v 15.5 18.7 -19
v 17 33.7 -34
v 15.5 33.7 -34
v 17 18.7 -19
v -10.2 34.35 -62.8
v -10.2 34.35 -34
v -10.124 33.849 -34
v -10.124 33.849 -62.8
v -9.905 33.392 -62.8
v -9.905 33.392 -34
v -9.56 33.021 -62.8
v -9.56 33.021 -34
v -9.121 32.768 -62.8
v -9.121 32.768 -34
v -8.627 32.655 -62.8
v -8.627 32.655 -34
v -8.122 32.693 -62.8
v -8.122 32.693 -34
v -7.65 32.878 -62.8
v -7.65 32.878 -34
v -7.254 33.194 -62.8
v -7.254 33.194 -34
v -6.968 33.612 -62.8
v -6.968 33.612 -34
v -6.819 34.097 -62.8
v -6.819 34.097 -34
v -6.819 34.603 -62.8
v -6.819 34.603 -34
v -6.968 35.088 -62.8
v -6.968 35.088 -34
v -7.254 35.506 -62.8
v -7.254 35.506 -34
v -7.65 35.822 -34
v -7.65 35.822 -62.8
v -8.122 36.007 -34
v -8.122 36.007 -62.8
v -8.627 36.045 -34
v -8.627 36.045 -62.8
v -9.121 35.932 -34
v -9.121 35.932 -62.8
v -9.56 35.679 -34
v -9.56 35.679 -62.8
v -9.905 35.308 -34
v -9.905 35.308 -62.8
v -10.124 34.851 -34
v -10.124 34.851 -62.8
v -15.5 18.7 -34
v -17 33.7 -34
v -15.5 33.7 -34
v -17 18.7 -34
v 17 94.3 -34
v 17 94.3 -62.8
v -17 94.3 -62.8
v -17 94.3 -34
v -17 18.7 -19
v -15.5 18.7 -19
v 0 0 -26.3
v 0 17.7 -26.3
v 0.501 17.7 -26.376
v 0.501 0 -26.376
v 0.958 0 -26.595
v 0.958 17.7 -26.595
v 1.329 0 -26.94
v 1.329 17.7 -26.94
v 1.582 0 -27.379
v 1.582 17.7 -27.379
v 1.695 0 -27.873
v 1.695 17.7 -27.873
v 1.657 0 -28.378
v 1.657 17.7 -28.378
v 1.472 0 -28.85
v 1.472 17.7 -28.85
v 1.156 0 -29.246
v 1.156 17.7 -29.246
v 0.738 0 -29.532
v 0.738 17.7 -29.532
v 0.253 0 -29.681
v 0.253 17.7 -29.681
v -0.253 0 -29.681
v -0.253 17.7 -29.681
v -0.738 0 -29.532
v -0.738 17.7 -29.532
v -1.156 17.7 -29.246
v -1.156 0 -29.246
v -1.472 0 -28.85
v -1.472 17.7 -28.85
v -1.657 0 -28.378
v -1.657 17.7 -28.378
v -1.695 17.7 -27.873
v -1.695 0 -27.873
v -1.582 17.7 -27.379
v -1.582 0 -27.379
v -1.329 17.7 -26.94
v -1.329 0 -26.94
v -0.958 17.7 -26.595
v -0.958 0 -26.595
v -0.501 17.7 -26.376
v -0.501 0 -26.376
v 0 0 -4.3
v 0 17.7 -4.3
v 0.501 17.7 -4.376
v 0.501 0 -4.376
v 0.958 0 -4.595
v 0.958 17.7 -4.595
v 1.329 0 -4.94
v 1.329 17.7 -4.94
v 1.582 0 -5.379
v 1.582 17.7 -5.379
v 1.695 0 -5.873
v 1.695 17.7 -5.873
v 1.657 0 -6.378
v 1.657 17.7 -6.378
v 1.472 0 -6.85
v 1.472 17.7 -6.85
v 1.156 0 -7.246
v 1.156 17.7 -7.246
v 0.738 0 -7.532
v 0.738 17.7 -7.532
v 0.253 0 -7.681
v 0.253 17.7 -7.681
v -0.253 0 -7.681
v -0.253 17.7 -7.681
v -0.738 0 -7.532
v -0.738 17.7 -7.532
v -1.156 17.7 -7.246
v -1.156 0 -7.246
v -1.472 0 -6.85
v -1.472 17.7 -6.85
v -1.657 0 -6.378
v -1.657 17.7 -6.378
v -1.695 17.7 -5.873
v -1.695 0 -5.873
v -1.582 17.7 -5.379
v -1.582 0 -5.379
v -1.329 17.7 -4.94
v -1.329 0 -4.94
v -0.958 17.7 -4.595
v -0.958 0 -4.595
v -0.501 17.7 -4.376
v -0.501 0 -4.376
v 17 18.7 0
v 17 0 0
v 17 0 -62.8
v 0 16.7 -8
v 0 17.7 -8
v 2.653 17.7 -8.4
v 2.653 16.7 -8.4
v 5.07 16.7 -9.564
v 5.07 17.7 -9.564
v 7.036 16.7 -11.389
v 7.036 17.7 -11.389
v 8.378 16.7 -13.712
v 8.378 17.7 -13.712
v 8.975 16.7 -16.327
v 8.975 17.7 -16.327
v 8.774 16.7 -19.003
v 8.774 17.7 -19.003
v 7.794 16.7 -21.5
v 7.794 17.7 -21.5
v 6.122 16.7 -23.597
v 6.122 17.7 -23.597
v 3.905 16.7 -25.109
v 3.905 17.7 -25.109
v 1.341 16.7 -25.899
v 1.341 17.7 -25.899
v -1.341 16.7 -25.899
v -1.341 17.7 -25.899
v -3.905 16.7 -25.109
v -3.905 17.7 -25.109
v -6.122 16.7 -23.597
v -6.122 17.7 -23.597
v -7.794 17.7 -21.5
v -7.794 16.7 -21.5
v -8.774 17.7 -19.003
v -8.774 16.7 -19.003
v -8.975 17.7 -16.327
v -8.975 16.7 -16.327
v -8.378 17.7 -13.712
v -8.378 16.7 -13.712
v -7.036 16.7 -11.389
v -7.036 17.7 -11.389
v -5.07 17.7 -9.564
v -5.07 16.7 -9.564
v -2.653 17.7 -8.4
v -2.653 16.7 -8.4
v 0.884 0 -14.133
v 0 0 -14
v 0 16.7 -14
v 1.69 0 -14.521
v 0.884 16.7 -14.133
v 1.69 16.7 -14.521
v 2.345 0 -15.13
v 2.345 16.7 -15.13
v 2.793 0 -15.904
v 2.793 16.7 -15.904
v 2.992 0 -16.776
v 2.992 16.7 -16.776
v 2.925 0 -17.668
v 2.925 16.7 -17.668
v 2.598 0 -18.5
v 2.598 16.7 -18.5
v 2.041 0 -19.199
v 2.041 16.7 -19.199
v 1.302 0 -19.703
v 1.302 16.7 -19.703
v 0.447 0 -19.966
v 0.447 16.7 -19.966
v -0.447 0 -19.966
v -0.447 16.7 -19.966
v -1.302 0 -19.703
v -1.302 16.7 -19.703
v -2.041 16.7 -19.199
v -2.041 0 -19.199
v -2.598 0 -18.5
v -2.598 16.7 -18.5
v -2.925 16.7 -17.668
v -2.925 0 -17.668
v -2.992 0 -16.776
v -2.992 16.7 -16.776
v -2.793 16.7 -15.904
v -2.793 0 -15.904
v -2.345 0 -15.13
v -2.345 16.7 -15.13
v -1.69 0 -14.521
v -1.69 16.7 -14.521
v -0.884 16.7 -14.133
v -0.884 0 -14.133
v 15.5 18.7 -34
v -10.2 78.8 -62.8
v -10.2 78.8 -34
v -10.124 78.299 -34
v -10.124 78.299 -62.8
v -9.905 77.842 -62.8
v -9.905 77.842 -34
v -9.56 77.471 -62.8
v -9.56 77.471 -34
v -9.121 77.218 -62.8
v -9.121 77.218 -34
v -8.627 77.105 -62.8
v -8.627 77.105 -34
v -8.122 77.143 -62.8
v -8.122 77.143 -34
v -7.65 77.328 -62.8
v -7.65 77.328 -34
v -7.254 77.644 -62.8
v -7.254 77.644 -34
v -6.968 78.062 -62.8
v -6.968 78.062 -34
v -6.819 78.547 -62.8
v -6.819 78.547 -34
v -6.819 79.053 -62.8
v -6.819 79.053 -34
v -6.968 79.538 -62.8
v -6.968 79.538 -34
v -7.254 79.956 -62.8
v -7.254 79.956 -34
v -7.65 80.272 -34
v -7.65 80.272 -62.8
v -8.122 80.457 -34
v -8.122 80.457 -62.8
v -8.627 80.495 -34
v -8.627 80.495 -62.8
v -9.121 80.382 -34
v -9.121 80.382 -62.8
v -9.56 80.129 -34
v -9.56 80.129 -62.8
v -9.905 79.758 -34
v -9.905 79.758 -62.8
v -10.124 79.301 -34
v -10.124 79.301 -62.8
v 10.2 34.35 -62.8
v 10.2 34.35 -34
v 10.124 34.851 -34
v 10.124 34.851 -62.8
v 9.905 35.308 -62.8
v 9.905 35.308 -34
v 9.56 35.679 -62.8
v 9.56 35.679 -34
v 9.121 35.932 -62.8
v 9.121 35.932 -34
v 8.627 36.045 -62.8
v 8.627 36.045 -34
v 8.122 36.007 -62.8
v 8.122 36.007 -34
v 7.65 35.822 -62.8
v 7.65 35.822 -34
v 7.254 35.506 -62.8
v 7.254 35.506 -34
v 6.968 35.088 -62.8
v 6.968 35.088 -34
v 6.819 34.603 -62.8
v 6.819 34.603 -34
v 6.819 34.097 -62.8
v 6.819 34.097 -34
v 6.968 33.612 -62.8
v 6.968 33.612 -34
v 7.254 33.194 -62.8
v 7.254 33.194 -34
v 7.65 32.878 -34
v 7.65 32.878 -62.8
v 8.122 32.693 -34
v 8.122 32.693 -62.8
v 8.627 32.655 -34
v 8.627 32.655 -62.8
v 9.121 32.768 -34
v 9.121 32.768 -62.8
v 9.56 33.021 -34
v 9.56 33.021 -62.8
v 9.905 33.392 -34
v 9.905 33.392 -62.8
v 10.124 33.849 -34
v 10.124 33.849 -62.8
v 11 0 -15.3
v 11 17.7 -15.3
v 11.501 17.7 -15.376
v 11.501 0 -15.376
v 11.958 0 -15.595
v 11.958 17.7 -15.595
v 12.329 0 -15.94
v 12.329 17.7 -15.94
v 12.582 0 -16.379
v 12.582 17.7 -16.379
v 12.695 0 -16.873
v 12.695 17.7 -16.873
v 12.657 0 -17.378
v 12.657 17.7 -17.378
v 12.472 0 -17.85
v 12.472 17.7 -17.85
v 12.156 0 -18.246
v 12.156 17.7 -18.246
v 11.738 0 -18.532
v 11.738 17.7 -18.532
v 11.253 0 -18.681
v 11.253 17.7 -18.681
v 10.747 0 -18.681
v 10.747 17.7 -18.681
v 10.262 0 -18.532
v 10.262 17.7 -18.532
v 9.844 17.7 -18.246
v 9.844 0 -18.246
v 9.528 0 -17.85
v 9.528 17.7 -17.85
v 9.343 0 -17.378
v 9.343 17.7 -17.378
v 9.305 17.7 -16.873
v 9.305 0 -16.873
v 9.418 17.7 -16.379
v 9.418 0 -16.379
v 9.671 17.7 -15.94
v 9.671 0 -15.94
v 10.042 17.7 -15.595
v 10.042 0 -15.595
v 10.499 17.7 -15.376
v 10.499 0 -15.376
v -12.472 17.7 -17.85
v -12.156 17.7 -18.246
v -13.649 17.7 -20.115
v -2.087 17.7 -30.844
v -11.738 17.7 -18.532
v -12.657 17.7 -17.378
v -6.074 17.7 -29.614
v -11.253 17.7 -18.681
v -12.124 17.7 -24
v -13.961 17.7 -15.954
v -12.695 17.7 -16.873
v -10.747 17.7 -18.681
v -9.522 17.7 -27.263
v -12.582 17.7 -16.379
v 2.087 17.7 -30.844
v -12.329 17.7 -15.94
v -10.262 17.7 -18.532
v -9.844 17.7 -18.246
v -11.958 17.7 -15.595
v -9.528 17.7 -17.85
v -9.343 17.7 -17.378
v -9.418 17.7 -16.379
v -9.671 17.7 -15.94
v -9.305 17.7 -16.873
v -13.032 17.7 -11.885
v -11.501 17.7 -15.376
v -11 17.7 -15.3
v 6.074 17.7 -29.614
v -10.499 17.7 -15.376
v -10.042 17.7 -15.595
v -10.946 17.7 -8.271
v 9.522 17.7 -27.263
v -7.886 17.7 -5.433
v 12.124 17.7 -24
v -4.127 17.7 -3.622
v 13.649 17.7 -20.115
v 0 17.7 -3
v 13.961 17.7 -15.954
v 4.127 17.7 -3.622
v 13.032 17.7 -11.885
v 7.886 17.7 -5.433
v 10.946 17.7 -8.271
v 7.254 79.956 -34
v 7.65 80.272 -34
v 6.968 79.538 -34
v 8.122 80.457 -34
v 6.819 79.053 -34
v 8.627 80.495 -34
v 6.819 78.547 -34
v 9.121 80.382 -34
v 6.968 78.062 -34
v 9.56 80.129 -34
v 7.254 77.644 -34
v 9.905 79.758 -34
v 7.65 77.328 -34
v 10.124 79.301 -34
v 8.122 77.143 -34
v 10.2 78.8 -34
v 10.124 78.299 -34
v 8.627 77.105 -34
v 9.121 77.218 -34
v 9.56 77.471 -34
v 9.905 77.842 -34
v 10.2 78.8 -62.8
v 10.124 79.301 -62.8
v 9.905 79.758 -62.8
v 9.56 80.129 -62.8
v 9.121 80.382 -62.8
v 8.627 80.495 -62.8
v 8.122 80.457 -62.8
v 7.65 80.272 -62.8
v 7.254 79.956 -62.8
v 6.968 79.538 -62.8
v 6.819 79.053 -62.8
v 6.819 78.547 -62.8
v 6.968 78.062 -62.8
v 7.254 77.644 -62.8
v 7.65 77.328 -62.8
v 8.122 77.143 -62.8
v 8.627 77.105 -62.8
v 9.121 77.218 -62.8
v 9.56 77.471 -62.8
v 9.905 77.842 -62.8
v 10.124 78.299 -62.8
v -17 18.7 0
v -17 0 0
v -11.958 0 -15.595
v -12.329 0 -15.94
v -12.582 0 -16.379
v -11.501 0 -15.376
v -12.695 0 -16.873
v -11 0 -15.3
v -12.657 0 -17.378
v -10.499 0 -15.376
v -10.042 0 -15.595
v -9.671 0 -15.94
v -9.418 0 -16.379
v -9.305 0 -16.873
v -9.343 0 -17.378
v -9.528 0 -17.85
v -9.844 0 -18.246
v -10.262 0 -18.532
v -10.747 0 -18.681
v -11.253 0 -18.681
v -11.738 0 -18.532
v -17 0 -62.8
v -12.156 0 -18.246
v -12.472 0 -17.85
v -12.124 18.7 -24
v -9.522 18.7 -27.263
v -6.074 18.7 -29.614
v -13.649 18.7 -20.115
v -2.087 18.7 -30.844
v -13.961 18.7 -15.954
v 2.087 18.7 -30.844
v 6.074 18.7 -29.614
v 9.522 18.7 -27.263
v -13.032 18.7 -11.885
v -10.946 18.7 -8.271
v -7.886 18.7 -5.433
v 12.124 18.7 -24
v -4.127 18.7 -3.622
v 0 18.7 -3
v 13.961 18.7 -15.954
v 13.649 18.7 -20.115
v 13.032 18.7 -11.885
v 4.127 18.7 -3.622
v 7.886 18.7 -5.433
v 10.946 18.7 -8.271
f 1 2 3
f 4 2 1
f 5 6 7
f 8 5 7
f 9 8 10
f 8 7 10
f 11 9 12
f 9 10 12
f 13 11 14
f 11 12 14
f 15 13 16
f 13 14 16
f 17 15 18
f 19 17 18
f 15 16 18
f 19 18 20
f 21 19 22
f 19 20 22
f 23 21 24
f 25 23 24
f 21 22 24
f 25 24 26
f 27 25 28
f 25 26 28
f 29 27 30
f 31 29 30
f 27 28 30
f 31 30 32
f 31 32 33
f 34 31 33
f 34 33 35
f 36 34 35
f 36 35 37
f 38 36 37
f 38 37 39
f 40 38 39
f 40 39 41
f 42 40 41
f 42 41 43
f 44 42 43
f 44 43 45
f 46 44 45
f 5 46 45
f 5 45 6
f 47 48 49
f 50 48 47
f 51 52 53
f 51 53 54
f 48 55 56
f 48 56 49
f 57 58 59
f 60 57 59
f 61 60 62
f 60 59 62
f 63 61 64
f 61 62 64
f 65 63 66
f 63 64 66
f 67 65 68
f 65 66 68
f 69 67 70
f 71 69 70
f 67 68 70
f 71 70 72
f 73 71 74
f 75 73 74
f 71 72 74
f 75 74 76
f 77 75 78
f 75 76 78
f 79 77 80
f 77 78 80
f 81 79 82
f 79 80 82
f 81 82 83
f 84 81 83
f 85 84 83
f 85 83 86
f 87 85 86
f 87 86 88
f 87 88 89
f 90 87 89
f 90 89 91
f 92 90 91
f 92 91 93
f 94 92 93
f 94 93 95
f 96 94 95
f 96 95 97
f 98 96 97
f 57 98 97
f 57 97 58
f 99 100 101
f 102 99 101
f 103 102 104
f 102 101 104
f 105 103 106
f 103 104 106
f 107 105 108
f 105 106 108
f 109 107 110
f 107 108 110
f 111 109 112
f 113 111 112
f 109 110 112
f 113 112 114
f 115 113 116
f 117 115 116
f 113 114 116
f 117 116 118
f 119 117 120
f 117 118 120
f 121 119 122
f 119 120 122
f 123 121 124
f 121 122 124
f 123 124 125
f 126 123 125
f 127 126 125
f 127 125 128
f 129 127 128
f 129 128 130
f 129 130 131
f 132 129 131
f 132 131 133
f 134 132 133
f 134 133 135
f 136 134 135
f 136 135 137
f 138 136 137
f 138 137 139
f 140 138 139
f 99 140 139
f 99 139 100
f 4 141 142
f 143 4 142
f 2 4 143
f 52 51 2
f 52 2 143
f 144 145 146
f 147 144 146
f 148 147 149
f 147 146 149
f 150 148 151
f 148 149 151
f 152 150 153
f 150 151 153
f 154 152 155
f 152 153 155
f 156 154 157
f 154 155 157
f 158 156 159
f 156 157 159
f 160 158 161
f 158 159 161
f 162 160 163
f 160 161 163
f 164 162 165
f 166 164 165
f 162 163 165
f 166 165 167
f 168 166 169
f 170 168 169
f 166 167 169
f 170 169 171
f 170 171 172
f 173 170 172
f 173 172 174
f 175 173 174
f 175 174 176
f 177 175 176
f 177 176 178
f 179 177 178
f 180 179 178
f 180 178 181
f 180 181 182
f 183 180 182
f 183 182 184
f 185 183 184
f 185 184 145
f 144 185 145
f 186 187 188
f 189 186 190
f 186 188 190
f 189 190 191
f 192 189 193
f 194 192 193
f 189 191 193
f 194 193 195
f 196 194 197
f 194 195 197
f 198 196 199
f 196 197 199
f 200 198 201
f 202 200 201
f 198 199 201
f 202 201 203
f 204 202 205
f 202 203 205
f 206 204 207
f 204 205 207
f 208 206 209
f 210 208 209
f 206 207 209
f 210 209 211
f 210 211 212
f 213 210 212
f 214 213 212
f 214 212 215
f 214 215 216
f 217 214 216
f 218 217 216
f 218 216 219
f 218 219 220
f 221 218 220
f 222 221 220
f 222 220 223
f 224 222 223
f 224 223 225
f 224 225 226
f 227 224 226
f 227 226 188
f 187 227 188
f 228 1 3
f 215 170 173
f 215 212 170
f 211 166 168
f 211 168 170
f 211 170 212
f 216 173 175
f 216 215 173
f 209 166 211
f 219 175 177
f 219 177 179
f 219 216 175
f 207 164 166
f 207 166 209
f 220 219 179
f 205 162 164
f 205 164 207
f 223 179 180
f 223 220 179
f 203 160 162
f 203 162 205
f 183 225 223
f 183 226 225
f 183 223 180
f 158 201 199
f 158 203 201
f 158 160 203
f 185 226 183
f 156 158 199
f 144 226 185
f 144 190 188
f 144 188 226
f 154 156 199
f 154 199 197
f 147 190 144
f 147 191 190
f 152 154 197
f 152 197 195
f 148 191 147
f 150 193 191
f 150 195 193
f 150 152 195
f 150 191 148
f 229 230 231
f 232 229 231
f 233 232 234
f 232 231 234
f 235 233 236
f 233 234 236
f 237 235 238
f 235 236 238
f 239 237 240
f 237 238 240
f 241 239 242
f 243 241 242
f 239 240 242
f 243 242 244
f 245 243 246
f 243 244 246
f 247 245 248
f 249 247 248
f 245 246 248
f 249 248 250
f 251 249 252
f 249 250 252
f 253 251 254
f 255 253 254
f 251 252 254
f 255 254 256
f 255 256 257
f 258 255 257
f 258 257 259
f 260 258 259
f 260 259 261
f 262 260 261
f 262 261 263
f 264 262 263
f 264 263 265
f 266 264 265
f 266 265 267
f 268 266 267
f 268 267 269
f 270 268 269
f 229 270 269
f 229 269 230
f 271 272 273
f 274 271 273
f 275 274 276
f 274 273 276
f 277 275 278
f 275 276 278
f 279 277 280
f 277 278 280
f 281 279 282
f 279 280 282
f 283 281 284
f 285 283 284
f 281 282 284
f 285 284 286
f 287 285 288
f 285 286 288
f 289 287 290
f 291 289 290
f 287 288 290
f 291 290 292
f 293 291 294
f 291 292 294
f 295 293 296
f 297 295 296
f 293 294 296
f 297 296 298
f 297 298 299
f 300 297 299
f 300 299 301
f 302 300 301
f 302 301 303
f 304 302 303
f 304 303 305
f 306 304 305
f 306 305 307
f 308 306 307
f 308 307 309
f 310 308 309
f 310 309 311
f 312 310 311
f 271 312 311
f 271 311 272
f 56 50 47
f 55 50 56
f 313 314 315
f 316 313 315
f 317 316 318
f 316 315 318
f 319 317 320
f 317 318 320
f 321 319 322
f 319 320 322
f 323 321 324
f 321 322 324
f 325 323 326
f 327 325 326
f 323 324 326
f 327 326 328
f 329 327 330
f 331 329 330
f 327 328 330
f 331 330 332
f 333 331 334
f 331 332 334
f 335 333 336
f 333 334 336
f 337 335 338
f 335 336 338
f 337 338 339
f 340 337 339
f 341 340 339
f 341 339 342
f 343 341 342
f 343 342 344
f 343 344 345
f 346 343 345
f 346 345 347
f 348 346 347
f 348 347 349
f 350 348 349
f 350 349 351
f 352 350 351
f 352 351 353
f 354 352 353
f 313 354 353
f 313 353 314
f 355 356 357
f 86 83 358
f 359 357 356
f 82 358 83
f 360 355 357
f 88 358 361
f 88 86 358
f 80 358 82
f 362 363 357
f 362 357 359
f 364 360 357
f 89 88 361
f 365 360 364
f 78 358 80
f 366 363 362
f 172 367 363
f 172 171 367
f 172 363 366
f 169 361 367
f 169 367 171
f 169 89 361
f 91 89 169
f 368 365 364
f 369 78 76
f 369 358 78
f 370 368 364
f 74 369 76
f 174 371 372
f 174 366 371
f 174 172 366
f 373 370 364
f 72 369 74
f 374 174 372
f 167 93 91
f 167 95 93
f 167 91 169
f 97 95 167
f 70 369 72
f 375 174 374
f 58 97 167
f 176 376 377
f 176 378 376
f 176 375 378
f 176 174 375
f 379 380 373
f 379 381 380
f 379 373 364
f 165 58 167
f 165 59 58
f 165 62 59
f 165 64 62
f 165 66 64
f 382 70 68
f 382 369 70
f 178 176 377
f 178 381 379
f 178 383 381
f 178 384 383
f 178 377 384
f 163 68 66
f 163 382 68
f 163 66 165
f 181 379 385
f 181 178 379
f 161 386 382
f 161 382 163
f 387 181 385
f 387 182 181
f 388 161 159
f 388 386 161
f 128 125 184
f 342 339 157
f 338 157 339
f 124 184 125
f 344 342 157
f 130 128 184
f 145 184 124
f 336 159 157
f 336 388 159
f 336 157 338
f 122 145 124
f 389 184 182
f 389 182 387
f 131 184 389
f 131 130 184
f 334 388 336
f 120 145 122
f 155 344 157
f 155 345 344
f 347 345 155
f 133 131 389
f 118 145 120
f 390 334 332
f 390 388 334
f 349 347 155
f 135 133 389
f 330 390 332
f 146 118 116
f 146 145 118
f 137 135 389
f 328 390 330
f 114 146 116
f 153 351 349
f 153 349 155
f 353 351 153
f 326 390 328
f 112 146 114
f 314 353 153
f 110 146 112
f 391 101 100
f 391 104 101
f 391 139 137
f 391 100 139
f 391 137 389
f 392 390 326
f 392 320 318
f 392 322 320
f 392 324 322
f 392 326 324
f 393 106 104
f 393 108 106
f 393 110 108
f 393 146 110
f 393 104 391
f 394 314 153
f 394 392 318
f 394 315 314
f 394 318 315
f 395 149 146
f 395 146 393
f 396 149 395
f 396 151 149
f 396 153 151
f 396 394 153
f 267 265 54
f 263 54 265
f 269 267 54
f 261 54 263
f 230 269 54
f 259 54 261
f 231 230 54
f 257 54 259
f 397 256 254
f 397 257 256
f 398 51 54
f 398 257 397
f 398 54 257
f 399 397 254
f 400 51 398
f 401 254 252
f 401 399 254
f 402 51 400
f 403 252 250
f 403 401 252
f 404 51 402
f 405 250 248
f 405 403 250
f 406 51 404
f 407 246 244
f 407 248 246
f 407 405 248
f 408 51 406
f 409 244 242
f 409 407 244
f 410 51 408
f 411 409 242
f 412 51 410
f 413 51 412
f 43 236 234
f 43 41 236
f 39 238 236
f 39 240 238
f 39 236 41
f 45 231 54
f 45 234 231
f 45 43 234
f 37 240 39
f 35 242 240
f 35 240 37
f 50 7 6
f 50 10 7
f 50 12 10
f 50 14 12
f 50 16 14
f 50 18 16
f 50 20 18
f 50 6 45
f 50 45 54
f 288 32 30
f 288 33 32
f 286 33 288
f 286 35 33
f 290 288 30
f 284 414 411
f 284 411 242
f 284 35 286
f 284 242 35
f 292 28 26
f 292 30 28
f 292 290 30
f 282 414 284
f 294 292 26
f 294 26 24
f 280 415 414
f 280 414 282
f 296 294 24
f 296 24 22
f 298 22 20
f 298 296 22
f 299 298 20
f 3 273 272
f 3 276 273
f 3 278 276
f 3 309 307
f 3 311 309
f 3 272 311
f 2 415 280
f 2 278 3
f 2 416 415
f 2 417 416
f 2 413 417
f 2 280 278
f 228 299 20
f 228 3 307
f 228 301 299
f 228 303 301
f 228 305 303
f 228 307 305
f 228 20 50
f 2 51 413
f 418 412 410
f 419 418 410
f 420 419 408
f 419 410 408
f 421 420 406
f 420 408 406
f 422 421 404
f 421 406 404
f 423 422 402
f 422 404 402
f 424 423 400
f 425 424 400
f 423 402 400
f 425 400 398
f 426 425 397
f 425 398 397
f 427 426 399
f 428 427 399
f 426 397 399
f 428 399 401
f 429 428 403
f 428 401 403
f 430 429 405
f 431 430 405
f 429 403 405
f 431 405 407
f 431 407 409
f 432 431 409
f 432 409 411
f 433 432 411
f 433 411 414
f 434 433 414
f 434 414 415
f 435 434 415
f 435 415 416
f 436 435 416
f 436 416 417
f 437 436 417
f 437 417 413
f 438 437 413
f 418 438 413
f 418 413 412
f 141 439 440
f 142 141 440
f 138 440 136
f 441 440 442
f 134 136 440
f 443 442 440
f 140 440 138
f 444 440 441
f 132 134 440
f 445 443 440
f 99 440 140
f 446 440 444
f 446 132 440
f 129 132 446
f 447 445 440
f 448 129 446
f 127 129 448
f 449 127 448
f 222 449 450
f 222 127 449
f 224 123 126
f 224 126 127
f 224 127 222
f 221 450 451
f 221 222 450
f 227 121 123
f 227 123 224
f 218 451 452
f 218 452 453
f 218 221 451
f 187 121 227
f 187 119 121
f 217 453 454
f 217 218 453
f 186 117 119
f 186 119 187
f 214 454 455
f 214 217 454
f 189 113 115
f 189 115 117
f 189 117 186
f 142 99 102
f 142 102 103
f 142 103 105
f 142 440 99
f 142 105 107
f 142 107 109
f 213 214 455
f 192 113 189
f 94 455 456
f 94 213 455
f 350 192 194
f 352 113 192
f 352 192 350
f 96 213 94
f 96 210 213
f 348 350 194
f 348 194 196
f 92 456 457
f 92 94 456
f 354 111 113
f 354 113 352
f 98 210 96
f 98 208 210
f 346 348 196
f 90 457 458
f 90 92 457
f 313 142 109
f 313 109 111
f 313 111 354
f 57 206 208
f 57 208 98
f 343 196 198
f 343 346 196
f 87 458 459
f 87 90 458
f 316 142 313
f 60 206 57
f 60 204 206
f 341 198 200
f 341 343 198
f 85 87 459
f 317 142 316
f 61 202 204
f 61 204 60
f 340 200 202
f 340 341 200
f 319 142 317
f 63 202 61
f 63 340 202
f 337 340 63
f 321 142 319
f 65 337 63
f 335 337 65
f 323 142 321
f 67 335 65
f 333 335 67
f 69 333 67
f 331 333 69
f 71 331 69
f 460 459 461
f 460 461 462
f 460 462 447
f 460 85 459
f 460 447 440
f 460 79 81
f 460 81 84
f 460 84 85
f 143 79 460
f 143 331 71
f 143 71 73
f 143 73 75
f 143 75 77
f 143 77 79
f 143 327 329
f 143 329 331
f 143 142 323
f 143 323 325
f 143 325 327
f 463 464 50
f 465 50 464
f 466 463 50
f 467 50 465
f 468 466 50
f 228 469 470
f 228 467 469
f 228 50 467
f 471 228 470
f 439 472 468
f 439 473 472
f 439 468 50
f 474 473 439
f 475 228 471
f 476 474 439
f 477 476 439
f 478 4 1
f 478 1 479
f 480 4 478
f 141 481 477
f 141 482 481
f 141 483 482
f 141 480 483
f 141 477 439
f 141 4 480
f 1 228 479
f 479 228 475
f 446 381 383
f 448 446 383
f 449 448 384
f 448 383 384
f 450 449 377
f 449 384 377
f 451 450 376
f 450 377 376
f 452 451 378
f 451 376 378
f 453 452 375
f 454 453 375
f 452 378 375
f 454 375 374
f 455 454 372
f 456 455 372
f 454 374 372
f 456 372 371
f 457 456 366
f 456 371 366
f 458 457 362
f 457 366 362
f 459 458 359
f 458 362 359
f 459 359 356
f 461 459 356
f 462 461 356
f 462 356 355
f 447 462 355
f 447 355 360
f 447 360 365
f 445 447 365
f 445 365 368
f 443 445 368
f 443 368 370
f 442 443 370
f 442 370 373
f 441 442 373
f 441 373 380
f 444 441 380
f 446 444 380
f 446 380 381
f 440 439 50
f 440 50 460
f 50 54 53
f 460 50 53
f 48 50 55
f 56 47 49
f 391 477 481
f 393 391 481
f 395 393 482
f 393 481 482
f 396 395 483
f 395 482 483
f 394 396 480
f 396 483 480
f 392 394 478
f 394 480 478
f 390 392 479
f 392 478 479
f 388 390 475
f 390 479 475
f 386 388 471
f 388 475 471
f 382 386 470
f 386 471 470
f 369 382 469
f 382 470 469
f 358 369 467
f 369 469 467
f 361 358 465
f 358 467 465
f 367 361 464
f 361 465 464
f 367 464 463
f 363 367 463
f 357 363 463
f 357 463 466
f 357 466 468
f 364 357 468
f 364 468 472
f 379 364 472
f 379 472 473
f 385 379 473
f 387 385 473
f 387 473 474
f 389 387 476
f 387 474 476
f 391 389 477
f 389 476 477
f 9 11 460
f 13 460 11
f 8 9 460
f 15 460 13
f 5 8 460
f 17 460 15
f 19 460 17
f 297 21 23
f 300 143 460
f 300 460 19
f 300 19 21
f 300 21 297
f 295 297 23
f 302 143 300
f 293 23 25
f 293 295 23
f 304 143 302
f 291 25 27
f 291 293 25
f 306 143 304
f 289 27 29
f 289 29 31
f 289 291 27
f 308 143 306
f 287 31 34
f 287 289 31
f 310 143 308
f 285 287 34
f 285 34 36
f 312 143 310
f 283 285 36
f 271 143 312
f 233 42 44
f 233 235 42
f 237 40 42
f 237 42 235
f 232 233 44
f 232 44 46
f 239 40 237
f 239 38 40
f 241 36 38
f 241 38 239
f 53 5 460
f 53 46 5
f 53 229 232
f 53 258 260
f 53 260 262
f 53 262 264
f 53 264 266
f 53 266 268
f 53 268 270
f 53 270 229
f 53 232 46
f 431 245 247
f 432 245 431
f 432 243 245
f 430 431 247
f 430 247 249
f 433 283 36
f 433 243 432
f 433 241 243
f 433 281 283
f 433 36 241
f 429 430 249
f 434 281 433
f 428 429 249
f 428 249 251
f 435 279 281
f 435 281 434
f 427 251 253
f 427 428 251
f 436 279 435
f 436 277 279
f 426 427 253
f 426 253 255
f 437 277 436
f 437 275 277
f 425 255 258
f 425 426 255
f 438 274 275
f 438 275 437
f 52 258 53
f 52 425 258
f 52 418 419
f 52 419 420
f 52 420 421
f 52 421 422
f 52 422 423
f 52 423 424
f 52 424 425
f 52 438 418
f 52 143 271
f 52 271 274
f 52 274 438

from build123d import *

# Parameters (mm, degrees)
BOSS_EXTRUDE1_DEPTH = 17
SKETCH2_R           = 1.7
CUT_EXTRUDE1_DEPTH  = 102.673447861
SKETCH5_R           = 14
CUT_EXTRUDE3_DEPTH  = 1
SKETCH4_R           = 9
CUT_EXTRUDE2_DEPTH  = 2
SKETCH6_R           = 1.7
SKETCH6_R_2         = 3
CUT_EXTRUDE4_DEPTH  = 101.500746266
BOSS_EXTRUDE2_DEPTH = 1.5
BOSS_EXTRUDE3_DEPTH = 1.5


with BuildPart() as part:
    # Sketch1 → Boss-Extrude1 (new, symmetric)
    with BuildSketch(Plane(origin=(0, 0, 0), x_dir=(0, 0, -1), z_dir=(1, 0, 0))):
        Polygon((0, 0), (62.8, 0), (62.8, 94.3), (34, 94.3), (34, 18.7), (0, 18.7), align=None)
    extrude(amount=BOSS_EXTRUDE1_DEPTH, both=True)

    # Sketch2 → Cut-Extrude1 (cut, through all)
    with BuildSketch(Plane.XY.offset(-34)):
        with Locations((8.5, 34.35)):
            Circle(SKETCH2_R)
        with Locations((8.5, 78.8)):
            Circle(SKETCH2_R)
        with Locations(Location((-8.5, 34.35, 0), (0, 0, 180))):
            Circle(SKETCH2_R)
        with Locations(Location((-8.5, 78.8, 0), (0, 0, 180))):
            Circle(SKETCH2_R)
    extrude(amount=-CUT_EXTRUDE1_DEPTH, mode=Mode.SUBTRACT)

    # Sketch5 → Cut-Extrude3 (cut)
    with BuildSketch(Plane(origin=(0, 18.7, 0), x_dir=(1, 0, 0), z_dir=(0, 1, 0))):
        with Locations(Location((0, 17, 0), (0, 0, 270))):
            Circle(SKETCH5_R)
    extrude(amount=-CUT_EXTRUDE3_DEPTH, mode=Mode.SUBTRACT)

    # Sketch4 → Cut-Extrude2 (cut)
    with BuildSketch(Plane(origin=(0, 18.7, 0), x_dir=(1, 0, 0), z_dir=(0, 1, 0))):
        with Locations(Location((0, 17, 0), (0, 0, 270))):
            Circle(SKETCH4_R)
    extrude(amount=-CUT_EXTRUDE2_DEPTH, mode=Mode.SUBTRACT)

    # Sketch6 → Cut-Extrude4 (cut, through all)
    with BuildSketch(Plane(origin=(0, 17.7, 0), x_dir=(1, 0, 0), z_dir=(0, 1, 0))):
        with Locations(Location((0, 6, 0), (0, 0, 270))):
            Circle(SKETCH6_R)
        with Locations(Location((0, 28, 0), (0, 0, 270))):
            Circle(SKETCH6_R)
        with Locations(Location((11, 17, 0), (0, 0, 270))):
            Circle(SKETCH6_R)
        with Locations(Location((-11, 17, 0), (0, 0, 270))):
            Circle(SKETCH6_R)
        with Locations(Location((0, 17, 0), (0, 0, 270))):
            Circle(SKETCH6_R_2)
    extrude(amount=-CUT_EXTRUDE4_DEPTH, mode=Mode.SUBTRACT)

    # Sketch8 → Boss-Extrude2 (add)
    with BuildSketch(Plane(origin=(17, 0, 0), x_dir=(0, 0, -1), z_dir=(1, 0, 0))):
        Polygon((34, 18.7), (34, 33.7), (19, 18.7), align=None)
    extrude(amount=-BOSS_EXTRUDE2_DEPTH)


with BuildPart() as body_2:
    # Sketch9 → Boss-Extrude3 (new body)
    with BuildSketch(Plane.ZY.offset(17)):
        Polygon((-34, 18.7), (-19, 18.7), (-34, 33.7), align=None)
    extrude(amount=-BOSS_EXTRUDE3_DEPTH)


solid = Compound([part.part, body_2.part])
